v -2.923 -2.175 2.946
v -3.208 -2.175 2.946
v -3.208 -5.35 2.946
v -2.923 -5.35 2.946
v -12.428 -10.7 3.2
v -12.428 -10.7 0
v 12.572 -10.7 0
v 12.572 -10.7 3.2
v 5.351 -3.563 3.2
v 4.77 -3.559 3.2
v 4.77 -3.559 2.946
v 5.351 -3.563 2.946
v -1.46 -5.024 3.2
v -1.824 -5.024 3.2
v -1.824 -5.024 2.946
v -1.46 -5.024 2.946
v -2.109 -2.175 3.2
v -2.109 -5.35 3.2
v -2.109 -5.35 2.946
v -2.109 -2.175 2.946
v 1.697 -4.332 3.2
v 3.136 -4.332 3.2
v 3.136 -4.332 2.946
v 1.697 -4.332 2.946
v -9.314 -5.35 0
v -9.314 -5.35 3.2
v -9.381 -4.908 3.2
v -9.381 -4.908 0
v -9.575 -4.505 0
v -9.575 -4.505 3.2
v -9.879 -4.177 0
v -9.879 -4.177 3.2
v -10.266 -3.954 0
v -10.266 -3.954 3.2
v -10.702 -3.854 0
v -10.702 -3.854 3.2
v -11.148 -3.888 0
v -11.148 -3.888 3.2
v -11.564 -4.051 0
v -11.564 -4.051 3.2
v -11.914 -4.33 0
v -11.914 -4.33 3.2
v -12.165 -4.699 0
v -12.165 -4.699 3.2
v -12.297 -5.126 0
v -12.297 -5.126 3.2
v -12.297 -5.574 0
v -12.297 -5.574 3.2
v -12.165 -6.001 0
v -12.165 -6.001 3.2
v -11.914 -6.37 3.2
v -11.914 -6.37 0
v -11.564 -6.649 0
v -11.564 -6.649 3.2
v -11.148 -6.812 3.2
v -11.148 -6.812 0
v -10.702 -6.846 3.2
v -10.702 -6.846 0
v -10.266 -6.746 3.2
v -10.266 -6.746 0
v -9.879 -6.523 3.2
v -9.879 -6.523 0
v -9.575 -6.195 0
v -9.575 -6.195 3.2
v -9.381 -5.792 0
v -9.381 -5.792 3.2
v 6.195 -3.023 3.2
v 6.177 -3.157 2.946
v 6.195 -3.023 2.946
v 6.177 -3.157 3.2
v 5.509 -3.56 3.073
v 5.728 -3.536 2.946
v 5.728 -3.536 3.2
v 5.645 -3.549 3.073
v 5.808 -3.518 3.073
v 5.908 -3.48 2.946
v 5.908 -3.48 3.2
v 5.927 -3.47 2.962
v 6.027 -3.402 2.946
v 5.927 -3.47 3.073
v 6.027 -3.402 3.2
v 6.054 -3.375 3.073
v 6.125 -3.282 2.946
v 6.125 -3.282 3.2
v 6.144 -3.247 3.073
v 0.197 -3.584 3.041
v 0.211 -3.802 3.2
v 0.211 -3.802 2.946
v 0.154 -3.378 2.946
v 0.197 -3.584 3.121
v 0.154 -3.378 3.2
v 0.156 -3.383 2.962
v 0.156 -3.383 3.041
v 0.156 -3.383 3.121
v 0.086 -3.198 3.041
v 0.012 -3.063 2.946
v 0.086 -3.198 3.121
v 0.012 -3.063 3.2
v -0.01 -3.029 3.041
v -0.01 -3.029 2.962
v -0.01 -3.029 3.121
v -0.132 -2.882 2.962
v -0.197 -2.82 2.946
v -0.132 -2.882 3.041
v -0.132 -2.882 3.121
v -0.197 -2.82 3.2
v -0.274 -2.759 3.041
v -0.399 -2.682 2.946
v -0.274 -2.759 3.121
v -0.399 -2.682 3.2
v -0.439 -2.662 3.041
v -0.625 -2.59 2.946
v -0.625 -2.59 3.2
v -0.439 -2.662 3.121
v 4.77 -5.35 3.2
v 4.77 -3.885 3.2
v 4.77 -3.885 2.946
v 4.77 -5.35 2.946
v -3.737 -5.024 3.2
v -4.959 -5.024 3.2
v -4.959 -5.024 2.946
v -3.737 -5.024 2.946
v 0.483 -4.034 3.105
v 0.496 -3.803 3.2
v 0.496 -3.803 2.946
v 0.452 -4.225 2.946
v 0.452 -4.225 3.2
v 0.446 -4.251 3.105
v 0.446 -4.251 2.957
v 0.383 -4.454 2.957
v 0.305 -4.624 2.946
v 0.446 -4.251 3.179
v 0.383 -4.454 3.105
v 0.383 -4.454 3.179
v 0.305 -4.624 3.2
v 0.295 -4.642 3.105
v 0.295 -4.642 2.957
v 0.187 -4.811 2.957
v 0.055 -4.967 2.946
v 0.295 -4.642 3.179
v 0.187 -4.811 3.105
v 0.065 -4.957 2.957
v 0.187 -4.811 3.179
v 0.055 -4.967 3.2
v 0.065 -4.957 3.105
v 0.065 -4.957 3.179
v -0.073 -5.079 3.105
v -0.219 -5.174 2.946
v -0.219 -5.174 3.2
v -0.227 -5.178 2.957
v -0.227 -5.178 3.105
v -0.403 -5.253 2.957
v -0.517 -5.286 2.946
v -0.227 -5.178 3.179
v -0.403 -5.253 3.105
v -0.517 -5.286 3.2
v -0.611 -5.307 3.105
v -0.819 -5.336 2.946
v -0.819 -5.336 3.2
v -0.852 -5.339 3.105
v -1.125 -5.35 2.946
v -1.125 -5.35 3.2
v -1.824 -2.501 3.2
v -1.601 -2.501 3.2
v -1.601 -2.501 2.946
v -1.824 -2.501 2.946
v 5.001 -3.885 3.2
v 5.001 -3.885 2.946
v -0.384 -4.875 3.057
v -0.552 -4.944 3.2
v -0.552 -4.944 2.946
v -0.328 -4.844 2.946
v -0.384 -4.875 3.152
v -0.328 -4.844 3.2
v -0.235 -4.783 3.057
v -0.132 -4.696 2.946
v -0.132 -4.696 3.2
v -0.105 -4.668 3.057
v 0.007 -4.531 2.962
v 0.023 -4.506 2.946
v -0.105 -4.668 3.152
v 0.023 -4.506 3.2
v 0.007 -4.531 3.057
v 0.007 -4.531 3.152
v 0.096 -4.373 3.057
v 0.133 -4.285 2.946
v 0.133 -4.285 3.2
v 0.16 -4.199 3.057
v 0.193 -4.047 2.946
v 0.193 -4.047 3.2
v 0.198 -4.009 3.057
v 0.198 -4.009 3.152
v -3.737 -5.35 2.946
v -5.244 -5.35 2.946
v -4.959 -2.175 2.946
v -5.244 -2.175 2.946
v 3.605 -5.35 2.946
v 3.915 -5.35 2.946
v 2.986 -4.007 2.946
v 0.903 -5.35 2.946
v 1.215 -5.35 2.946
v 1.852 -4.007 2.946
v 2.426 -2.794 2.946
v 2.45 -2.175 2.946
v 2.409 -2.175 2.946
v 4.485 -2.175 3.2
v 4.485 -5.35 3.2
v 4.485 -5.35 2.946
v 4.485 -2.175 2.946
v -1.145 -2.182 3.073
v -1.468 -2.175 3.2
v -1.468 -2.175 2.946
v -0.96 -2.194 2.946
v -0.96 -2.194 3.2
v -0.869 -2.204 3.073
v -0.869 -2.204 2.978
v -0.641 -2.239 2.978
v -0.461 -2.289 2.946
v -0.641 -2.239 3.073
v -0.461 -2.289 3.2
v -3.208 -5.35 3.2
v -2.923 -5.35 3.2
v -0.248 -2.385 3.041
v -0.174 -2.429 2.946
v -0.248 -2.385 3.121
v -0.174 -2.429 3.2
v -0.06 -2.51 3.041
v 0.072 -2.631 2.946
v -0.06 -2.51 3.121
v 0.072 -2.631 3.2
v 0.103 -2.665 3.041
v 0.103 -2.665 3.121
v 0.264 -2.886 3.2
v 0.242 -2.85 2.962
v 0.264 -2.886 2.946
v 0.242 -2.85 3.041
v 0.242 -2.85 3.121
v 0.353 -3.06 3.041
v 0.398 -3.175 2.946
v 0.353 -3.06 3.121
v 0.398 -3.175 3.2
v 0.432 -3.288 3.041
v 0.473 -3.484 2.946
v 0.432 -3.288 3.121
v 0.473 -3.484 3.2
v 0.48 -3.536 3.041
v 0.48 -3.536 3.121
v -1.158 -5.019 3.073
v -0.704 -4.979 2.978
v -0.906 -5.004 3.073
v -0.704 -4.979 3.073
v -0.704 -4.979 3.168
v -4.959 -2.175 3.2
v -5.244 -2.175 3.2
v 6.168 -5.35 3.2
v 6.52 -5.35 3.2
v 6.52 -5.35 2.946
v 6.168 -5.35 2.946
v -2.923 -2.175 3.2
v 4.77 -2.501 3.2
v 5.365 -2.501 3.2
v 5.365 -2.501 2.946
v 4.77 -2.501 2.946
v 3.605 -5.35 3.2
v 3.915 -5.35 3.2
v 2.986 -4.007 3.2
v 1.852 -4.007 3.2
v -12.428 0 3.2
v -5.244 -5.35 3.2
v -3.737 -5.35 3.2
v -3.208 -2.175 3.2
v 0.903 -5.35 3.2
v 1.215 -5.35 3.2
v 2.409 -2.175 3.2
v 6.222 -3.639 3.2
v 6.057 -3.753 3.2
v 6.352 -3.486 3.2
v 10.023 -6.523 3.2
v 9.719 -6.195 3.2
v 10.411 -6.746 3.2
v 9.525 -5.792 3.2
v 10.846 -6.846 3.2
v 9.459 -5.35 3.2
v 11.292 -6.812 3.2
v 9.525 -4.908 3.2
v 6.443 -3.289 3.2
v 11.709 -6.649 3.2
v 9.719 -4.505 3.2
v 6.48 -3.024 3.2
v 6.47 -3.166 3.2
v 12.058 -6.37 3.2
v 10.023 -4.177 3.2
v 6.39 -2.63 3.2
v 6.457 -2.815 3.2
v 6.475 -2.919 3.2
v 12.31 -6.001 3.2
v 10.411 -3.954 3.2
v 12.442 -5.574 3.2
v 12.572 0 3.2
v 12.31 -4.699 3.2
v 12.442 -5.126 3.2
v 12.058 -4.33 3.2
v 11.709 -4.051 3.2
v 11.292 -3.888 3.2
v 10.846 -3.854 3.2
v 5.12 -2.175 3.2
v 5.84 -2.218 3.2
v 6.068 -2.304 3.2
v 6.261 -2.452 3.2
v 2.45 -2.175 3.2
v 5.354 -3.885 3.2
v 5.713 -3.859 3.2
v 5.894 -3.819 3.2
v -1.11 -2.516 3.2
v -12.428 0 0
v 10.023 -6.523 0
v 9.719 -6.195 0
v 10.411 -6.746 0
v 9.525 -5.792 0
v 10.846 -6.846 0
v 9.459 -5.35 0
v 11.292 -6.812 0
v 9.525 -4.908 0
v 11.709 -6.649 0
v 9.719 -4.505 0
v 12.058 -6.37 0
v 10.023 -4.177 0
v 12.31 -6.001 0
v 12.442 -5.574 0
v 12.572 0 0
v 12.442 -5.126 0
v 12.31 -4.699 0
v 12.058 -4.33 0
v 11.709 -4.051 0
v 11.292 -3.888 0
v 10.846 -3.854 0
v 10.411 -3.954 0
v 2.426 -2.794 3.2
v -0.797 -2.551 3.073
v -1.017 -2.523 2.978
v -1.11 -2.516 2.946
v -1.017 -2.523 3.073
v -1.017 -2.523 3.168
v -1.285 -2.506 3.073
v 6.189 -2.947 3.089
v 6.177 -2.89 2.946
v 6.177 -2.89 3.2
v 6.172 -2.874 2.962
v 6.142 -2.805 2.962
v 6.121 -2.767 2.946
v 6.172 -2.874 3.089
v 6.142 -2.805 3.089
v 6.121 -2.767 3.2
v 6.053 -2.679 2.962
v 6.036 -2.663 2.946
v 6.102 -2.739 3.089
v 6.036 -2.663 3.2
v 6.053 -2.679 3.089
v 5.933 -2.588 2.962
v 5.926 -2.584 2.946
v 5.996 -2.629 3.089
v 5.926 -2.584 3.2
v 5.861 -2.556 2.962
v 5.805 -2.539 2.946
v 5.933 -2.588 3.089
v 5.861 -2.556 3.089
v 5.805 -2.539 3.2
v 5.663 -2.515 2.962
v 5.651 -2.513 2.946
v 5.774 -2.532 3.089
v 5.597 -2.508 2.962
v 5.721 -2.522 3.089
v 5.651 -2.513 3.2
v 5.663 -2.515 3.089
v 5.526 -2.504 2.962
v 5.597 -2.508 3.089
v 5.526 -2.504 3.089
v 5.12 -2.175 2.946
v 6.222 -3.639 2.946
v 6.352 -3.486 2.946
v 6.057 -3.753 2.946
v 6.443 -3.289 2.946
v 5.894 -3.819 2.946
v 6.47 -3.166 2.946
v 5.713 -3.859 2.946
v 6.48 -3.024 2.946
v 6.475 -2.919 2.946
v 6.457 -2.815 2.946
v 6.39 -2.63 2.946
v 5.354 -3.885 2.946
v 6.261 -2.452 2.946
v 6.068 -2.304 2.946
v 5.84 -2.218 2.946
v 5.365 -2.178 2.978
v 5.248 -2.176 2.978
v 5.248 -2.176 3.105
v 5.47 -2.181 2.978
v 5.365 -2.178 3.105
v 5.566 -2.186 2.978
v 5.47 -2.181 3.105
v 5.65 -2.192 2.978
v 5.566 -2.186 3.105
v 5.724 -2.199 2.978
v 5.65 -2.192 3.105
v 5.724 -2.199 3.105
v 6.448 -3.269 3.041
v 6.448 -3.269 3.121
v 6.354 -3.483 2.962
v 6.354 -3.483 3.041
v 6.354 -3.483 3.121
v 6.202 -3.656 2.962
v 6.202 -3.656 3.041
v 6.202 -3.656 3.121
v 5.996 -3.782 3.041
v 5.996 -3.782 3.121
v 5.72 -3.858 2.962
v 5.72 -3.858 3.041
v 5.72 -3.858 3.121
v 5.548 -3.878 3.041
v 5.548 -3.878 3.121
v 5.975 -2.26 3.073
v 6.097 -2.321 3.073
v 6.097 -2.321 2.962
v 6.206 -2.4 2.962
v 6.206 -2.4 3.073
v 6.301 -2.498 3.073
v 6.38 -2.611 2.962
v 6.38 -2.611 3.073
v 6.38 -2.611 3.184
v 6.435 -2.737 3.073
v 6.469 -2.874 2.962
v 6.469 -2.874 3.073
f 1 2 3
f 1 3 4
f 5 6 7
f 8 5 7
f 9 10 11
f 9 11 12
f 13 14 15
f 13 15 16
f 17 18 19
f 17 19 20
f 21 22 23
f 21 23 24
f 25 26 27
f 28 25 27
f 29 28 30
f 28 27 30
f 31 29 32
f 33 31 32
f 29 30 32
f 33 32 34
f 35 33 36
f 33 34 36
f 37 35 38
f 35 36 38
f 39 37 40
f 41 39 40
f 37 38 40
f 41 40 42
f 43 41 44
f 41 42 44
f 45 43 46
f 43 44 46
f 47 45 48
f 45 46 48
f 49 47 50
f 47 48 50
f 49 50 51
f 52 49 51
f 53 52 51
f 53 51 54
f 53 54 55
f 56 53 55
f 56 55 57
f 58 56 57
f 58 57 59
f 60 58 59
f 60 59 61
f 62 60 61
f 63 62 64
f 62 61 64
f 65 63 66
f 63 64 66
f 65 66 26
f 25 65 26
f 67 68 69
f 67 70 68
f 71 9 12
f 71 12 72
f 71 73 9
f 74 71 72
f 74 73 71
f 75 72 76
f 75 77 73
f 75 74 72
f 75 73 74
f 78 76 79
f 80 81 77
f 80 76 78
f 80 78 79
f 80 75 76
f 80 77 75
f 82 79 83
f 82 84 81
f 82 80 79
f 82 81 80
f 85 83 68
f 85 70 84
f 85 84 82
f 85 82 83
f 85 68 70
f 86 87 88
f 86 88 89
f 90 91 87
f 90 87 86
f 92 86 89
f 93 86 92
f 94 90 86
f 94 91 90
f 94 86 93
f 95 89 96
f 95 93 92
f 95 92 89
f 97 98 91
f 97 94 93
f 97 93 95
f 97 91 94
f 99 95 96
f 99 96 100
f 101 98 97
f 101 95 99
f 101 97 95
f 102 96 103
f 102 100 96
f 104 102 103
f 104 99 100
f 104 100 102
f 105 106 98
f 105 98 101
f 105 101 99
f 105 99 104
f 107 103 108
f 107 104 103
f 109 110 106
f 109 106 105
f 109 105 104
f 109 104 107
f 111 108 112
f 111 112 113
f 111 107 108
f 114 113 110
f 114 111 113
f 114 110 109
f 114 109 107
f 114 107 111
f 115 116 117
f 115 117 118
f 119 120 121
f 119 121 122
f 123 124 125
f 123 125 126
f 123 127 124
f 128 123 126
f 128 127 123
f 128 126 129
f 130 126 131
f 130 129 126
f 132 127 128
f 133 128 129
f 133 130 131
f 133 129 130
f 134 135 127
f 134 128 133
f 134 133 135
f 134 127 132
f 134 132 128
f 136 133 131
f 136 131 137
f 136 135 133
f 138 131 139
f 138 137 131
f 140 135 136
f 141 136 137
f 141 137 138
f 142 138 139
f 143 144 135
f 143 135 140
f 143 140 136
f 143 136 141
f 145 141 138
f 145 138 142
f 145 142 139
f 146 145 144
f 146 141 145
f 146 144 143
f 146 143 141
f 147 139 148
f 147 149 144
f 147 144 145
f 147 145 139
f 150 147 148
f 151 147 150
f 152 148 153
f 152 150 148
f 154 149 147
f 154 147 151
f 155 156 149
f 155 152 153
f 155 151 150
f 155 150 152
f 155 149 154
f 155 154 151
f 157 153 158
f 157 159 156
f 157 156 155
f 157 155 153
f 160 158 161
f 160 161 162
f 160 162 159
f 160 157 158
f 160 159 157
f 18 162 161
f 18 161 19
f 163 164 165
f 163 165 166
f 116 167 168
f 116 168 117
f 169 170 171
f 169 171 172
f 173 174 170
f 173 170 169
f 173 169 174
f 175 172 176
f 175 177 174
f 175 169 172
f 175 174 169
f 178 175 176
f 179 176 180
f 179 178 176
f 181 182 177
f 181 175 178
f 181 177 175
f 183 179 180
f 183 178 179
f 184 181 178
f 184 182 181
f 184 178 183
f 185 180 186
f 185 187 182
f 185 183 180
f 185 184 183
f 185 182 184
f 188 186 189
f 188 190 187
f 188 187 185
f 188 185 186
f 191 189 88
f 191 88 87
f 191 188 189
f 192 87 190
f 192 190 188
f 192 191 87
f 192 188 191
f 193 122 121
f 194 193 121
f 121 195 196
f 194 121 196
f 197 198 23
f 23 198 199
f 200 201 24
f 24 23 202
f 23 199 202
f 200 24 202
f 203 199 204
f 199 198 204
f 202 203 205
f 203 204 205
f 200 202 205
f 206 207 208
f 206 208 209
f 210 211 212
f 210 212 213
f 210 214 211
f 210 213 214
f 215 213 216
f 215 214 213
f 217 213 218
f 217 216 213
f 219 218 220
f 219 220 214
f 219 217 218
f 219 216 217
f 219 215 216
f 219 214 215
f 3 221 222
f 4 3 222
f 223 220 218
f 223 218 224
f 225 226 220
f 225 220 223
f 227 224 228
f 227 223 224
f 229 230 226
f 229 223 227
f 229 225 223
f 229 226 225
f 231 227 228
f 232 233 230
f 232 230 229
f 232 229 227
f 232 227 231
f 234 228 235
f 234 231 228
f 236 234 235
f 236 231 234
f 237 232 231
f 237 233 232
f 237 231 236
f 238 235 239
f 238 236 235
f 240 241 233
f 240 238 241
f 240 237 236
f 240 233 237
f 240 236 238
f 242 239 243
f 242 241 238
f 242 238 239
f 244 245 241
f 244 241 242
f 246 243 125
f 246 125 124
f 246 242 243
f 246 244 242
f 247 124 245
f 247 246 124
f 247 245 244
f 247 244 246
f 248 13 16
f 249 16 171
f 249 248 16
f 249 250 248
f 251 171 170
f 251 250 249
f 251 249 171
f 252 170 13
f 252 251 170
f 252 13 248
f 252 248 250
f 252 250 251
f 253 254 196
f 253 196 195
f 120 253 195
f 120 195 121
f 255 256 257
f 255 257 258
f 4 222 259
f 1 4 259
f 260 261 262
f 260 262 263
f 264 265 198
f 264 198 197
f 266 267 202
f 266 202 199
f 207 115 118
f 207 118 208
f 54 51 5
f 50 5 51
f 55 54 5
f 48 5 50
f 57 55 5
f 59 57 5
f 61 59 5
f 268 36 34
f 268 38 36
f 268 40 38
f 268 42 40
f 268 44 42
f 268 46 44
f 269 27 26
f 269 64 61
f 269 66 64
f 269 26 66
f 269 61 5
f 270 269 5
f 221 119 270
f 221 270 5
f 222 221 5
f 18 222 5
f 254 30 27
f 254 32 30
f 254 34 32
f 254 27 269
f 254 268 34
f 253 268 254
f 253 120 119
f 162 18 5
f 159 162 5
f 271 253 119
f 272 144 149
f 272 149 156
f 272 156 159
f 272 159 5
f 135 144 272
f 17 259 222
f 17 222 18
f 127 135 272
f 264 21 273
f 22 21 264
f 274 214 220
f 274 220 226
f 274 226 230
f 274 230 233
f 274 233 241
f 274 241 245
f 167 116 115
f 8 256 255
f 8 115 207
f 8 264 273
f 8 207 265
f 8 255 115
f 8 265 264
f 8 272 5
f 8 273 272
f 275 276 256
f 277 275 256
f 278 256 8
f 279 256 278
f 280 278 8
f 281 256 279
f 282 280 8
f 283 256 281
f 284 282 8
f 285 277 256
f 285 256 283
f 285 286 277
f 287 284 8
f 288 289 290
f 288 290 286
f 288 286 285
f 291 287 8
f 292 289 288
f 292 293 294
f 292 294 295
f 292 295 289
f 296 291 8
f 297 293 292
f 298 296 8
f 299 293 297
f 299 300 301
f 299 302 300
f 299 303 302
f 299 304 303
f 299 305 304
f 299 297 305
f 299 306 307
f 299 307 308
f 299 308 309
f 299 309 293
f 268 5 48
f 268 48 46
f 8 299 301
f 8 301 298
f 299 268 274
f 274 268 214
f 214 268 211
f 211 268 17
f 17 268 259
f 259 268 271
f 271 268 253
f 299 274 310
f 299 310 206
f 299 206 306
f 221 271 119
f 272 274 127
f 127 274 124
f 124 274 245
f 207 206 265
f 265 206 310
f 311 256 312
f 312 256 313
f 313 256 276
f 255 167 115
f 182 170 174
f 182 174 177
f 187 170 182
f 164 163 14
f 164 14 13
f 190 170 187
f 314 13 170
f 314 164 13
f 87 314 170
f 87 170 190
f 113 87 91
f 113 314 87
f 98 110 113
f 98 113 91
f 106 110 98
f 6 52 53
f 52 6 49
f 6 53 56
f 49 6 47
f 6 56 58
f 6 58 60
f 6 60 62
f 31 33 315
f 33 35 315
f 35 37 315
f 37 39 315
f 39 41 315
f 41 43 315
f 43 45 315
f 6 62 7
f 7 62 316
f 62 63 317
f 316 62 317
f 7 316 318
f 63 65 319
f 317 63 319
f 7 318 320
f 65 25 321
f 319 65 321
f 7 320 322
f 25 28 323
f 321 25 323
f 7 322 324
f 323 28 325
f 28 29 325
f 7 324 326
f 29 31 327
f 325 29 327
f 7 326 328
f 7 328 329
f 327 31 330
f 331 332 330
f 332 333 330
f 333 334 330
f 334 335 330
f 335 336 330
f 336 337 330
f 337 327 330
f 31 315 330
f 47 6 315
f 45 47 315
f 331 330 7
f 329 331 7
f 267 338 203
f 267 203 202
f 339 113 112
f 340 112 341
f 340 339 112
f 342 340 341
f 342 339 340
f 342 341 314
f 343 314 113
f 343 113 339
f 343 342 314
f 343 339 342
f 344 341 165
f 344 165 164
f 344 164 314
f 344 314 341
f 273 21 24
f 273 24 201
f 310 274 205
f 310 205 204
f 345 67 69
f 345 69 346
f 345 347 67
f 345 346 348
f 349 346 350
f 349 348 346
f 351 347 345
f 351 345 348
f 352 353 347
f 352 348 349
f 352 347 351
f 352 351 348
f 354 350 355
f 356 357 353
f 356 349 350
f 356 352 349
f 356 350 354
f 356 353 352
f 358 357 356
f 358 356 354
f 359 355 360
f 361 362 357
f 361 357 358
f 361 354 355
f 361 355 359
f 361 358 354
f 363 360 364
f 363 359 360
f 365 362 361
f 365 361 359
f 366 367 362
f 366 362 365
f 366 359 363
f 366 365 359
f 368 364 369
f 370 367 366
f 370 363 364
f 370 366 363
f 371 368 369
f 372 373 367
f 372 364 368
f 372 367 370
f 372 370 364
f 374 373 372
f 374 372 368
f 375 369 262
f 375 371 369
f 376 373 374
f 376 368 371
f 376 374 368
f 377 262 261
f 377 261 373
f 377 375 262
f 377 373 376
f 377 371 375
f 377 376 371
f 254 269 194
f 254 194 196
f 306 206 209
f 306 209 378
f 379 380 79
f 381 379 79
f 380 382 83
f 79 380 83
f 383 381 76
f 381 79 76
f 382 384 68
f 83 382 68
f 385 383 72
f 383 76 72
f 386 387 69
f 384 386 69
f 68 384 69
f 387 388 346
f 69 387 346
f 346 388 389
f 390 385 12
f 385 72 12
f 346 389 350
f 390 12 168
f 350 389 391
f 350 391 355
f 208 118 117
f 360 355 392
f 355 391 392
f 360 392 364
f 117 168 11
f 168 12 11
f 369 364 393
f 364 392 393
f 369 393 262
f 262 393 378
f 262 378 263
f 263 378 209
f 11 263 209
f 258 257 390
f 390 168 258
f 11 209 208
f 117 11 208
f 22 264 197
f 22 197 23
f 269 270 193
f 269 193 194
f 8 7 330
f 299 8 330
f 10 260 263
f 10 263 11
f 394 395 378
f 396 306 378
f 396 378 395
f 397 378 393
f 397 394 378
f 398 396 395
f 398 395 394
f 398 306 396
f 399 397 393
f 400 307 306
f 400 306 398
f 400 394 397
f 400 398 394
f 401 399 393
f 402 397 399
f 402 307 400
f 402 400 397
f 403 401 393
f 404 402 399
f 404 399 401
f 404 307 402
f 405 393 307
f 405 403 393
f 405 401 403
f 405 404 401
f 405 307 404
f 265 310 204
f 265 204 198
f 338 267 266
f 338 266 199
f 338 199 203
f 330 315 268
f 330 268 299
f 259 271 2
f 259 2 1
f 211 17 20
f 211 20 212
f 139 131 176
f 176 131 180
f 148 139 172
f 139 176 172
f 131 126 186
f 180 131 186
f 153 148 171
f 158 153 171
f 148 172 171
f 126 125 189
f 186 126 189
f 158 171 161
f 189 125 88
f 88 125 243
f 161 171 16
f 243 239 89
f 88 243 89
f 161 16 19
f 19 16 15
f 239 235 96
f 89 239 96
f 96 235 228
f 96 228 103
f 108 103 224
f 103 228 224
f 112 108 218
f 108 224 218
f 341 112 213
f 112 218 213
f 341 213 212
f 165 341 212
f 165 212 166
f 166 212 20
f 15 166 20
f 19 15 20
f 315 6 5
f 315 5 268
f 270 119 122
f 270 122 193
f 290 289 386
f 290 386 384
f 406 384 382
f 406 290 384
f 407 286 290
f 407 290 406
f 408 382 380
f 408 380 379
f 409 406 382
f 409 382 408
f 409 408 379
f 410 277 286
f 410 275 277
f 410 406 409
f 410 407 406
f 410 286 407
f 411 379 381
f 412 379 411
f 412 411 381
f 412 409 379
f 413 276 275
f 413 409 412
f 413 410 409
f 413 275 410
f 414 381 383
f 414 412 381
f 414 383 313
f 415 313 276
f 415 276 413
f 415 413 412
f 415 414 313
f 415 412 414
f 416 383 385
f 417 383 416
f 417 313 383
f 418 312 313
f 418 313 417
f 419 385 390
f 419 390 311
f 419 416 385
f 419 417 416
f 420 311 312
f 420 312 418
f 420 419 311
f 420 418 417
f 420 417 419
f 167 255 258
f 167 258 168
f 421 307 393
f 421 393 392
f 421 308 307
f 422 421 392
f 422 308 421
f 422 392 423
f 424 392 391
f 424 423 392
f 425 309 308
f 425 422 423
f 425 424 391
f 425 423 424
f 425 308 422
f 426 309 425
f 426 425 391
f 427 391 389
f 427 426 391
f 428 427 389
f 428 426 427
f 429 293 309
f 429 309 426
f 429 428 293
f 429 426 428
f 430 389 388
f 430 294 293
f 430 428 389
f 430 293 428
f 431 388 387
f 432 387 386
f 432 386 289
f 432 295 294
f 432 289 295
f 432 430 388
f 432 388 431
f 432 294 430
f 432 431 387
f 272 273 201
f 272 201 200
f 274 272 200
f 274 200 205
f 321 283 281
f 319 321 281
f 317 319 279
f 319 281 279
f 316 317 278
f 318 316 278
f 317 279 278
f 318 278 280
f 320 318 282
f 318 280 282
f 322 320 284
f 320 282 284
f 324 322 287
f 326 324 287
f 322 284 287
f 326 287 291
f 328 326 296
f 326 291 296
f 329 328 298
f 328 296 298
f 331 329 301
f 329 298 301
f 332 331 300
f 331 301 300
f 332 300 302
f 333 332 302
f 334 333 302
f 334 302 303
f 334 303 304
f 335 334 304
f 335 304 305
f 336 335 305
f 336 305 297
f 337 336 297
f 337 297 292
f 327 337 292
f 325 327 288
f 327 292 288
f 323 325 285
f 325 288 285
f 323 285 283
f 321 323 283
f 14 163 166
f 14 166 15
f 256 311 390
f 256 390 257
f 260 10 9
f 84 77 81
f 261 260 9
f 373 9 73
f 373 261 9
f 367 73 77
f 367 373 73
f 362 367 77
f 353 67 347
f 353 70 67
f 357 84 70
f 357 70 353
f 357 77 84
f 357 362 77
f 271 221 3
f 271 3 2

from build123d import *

# Parameters (mm, degrees)
SKETCH2_W           = 25
SKETCH2_H           = 10.7
BOSS_EXTRUDE1_DEPTH = 3.2
SKETCH3_R           = 1.5
CUT_EXTRUDE2_DEPTH  = 3.2
SKETCH4_W           = 0.284935898
SKETCH4_H           = 3.175
CUT_EXTRUDE3_DEPTH  = 0.254


with BuildPart() as part:
    # Sketch2 → Boss-Extrude1 (new body)
    with BuildSketch(Plane.XY):
        with Locations((0.072254335, -5.35)):
            Rectangle(SKETCH2_W, SKETCH2_H)
    extrude(amount=BOSS_EXTRUDE1_DEPTH)

    # Sketch3 → Cut-Extrude2 (cut)
    with BuildSketch(Plane.XY.offset(3.2)):
        with Locations((-10.814046376, -5.35)):
            Circle(SKETCH3_R)
        with Locations(Location((10.958555047, -5.35, 0), (0, 0, 180))):
            Circle(SKETCH3_R)
    extrude(amount=-CUT_EXTRUDE2_DEPTH, mode=Mode.SUBTRACT)

    # Sketch4 → Cut-Extrude3 (cut)
    # profile 1 of 5: a face of its own
    with BuildSketch(Plane.XY.offset(3.2)):
        Polygon((-5.243533556, -2.175), (-4.958597658, -2.175), (-4.958597658, -5.024358974), (-3.737443812, -5.024358974), (-3.737443812, -5.35), (-5.243533556, -5.35), align=None)
    # profile 2 of 5: a face of its own
    with BuildSketch(Plane.XY.offset(3.2)):
        with Locations((-3.065809197, -3.7625)):
            Rectangle(SKETCH4_W, SKETCH4_H)
    # profile 3 of 5: a face of its own
    with BuildSketch(Plane.XY.offset(3.2)):
        with BuildLine():
            Line((-2.109238684, -5.35), (-2.109238684, -2.175))
            Line((-2.109238684, -2.175), (-1.468132915, -2.175))
            add(Edge.make_bspline(
                [(-1.468132915, -2.175), (-1.412371761, -2.175401474), (-1.304641503, -2.17617712), (-1.148964497, -2.181095097), (-1.004924941, -2.189795019), (-0.872996561, -2.202467375), (-0.752817176, -2.218027627), (-0.644723296, -2.237531565), (-0.548155995, -2.260562263), (-0.48876586, -2.280197778), (-0.460680992, -2.289483173)],
                knots=[0, 0, 0, 0, 1.314313732, 2.53924729, 3.670748893, 4.714932338, 5.66265055, 6.526160246, 7.303039223, 8, 8, 8, 8], degree=3))
            add(Edge.make_bspline(
                [(-0.460680992, -2.289483173), (-0.423946478, -2.303481027), (-0.351310468, -2.331159311), (-0.247889721, -2.383371099), (-0.150530285, -2.442528698), (-0.05871006, -2.508710088), (0.025473546, -2.583789176), (0.105309281, -2.664576675), (0.177531209, -2.754010383), (0.243669449, -2.850235551), (0.303301083, -2.952118627), (0.355134462, -3.059465476), (0.398182013, -3.171730943), (0.433917297, -3.288602827), (0.462080869, -3.410338113), (0.481295908, -3.537078548), (0.493969591, -3.668323242), (0.495243266, -3.757381505), (0.495889521, -3.802569111)],
                knots=[0, 0, 0, 0, 0.984719456, 1.947108742, 2.898477687, 3.838006223, 4.779231079, 5.722358779, 6.681677486, 7.655904652, 8.64651281, 9.637519902, 10.640069247, 11.656948941, 12.698408672, 13.768548281, 14.867775369, 16, 16, 16, 16], degree=3))
            add(Edge.make_bspline(
                [(0.495889521, -3.802569111), (0.495318958, -3.841813234), (0.494194603, -3.919147878), (0.484098724, -4.033122119), (0.46942449, -4.143715145), (0.446705825, -4.250400316), (0.419126402, -4.354112342), (0.383780351, -4.453745878), (0.343289579, -4.550214905), (0.296072904, -4.642215044), (0.244237505, -4.729376388), (0.188609923, -4.811541332), (0.129249492, -4.887537426), (0.065590168, -4.95759481), (-0.001545403, -5.02160787), (-0.07259676, -5.080111341), (-0.147747242, -5.131960502), (-0.226660255, -5.179192807), (-0.311637886, -5.220395558), (-0.404289708, -5.255257067), (-0.505010848, -5.284146497), (-0.61355408, -5.308250095), (-0.730106949, -5.327370219), (-0.854783725, -5.340184875), (-0.987392852, -5.34885075), (-1.078451186, -5.349609478), (-1.125319413, -5.35)],
                knots=[0, 0, 0, 0, 1.105936401, 2.179363191, 3.223086493, 4.248585256, 5.251745608, 6.245858792, 7.225916811, 8.198733463, 9.158002045, 10.082870192, 10.993790845, 11.873723703, 12.748670949, 13.606408763, 14.465103618, 15.319838547, 16.196477973, 17.123216899, 18.106603292, 19.147568657, 20.255746949, 21.433717677, 22.679120308, 24, 24, 24, 24], degree=3))
            Line((-1.125319413, -5.35), (-2.109238684, -5.35))
        make_face()
        with BuildLine():
            Line((-1.824302787, -5.024358974), (-1.459864686, -5.024358974))
            add(Edge.make_bspline(
                [(-1.459864686, -5.024358974), (-1.407496806, -5.024133916), (-1.306774196, -5.023701045), (-1.161941585, -5.019902653), (-1.029608132, -5.013696039), (-0.909755049, -5.005010075), (-0.802450005, -4.993517832), (-0.707468746, -4.980704527), (-0.625122619, -4.964741125), (-0.575293773, -4.950271326), (-0.55226753, -4.943584736)],
                knots=[0, 0, 0, 0, 1.375205317, 2.645023457, 3.804390687, 4.853969522, 5.800190428, 6.637939096, 7.370582563, 8, 8, 8, 8], degree=3))
            add(Edge.make_bspline(
                [(-0.55226753, -4.943584736), (-0.523285802, -4.933377965), (-0.466014573, -4.913208212), (-0.383572445, -4.876416619), (-0.306685734, -4.832835599), (-0.234014497, -4.784392108), (-0.166589602, -4.72937752), (-0.103612011, -4.668988123), (-0.04520852, -4.602916577), (0.00801746, -4.531244888), (0.055649992, -4.454419144), (0.096898893, -4.373194631), (0.133049926, -4.28846131), (0.161424078, -4.198918002), (0.183663215, -4.105365213), (0.199415467, -4.007796363), (0.209225967, -3.906229671), (0.210370281, -3.837148816), (0.210953624, -3.801933093)],
                knots=[0, 0, 0, 0, 0.998632004, 1.973411704, 2.929992603, 3.868527914, 4.809262121, 5.754881198, 6.702106254, 7.672490631, 8.653608572, 9.636854334, 10.631411391, 11.644891563, 12.686317036, 13.754757253, 14.855430412, 16, 16, 16, 16], degree=3))
            add(Edge.make_bspline(
                [(0.210953624, -3.801933093), (0.210487999, -3.764800579), (0.209573274, -3.691853426), (0.198075864, -3.584819009), (0.181274167, -3.481875848), (0.156977538, -3.383017056), (0.126015955, -3.288049765), (0.08737653, -3.19749921), (0.043228954, -3.110409079), (-0.009297645, -3.028789475), (-0.066824647, -2.951597869), (-0.130667438, -2.880881624), (-0.199811715, -2.816479652), (-0.273503329, -2.75738899), (-0.353819126, -2.705986941), (-0.438867117, -2.66000688), (-0.529894976, -2.620985322), (-0.593225064, -2.600230925), (-0.625409557, -2.589683494)],
                knots=[0, 0, 0, 0, 1.122418816, 2.205001699, 3.251619955, 4.274784885, 5.280384055, 6.268708349, 7.249350384, 8.229342522, 9.199999885, 10.157847722, 11.105861043, 12.055065948, 13.010012805, 13.98527497, 14.976112212, 16, 16, 16, 16], degree=3))
            add(Edge.make_bspline(
                [(-0.625409557, -2.589683494), (-0.65203524, -2.582320734), (-0.708648747, -2.566665487), (-0.801031689, -2.549588185), (-0.905004004, -2.534525532), (-1.021027304, -2.521772882), (-1.148969335, -2.512622241), (-1.288928494, -2.505753977), (-1.440965279, -2.501121532), (-1.546359434, -2.500805204), (-1.601060599, -2.500641026)],
                knots=[0, 0, 0, 0, 0.674548936, 1.434276114, 2.292660221, 3.240891867, 4.284742987, 5.42552168, 6.663806718, 8, 8, 8, 8], degree=3))
            Line((-1.601060599, -2.500641026), (-1.824302787, -2.500641026))
            Line((-1.824302787, -2.500641026), (-1.824302787, -5.024358974))
        make_face(mode=Mode.SUBTRACT)
    # profile 4 of 5: a face of its own
    with BuildSketch(Plane.XY.offset(3.2)):
        Polygon((2.449735675, -2.175), (3.91512029, -5.35), (3.605379705, -5.35), (3.135998696, -4.332371795), (1.696690803, -4.332371795), (1.214589441, -5.35), (0.902940803, -5.35), (2.409030547, -2.175), align=None)
        Polygon((2.426203023, -2.79448117), (1.851879104, -4.006730769), (2.985898536, -4.006730769), align=None, mode=Mode.SUBTRACT)
    # profile 5 of 5: a face of its own
    with BuildSketch(Plane.XY.offset(3.2)):
        with BuildLine():
            Line((4.484992085, -2.175), (5.120373696, -2.175))
            add(Edge.make_bspline(
                [(5.120373696, -2.175), (5.162774577, -2.175141139), (5.244188965, -2.175412141), (5.360823289, -2.176923226), (5.466802155, -2.181254248), (5.562070152, -2.18498132), (5.646625532, -2.191777582), (5.720727574, -2.198273311), (5.784034986, -2.206776561), (5.822358008, -2.214673623), (5.839709633, -2.218249199)],
                knots=[0, 0, 0, 0, 1.410062039, 2.707475311, 3.878576406, 4.937260626, 5.877586885, 6.699081471, 7.410979367, 8, 8, 8, 8], degree=3))
            add(Edge.make_bspline(
                [(5.839709633, -2.218249199), (5.862938499, -2.223988479), (5.908900697, -2.235344604), (5.975076828, -2.259347242), (6.038136251, -2.287123616), (6.09781702, -2.319747848), (6.153820202, -2.357462112), (6.206723241, -2.399615338), (6.256766197, -2.445976874), (6.301925247, -2.497715623), (6.344505673, -2.551995886), (6.380418213, -2.610691437), (6.411375805, -2.672070108), (6.436023345, -2.736756123), (6.455869793, -2.804122159), (6.469863596, -2.874778424), (6.478255744, -2.948403023), (6.479110142, -2.998620555), (6.479543367, -3.024083534)],
                knots=[0, 0, 0, 0, 1.027469482, 2.033020251, 3.019912614, 3.986113645, 4.951240523, 5.91722682, 6.890402269, 7.87763091, 8.8651537, 9.85103654, 10.82876324, 11.815024772, 12.821070561, 13.842952187, 14.906261191, 16, 16, 16, 16], degree=3))
            add(Edge.make_bspline(
                [(6.479543367, -3.024083534), (6.478210776, -3.066388236), (6.475610546, -3.148935667), (6.451367059, -3.268733752), (6.411655502, -3.380484059), (6.356933661, -3.48404588), (6.287247422, -3.577400537), (6.203495647, -3.659397593), (6.105631614, -3.728013799), (6.014527877, -3.775595987), (5.934051425, -3.806069554), (5.867799777, -3.827511108), (5.795530447, -3.844077319), (5.717935865, -3.858918296), (5.634693121, -3.870123047), (5.546001728, -3.878329601), (5.451798433, -3.883458631), (5.387083706, -3.884222449), (5.353792165, -3.884615385)],
                knots=[0, 0, 0, 0, 1.260483769, 2.459530307, 3.627416485, 4.787058657, 5.939039949, 7.08810263, 8.267026773, 9.491475466, 10.141966685, 10.831826277, 11.566392101, 12.351337768, 13.187381173, 14.07005841, 15.007169909, 16, 16, 16, 16], degree=3))
            Line((5.353792165, -3.884615385), (6.520248495, -5.35))
            Line((6.520248495, -5.35), (6.167894729, -5.35))
            Line((6.167894729, -5.35), (5.001438399, -3.884615385))
            Line((5.001438399, -3.884615385), (4.769927983, -3.884615385))
            Line((4.769927983, -3.884615385), (4.769927983, -5.35))
            Line((4.769927983, -5.35), (4.484992085, -5.35))
            Line((4.484992085, -5.35), (4.484992085, -2.175))
        make_face()
        with BuildLine():
            Line((4.769927983, -2.500641026), (4.769927983, -3.558974359))
            Line((4.769927983, -3.558974359), (5.351248095, -3.563426482))
            add(Edge.make_bspline(
                [(5.351248095, -3.563426482), (5.378389844, -3.56343849), (5.430998286, -3.563461764), (5.507108174, -3.559838838), (5.577974276, -3.5557174), (5.643325529, -3.54941335), (5.70319113, -3.541288914), (5.757541155, -3.531126207), (5.806464323, -3.519286121), (5.863522283, -3.500960361), (5.927236851, -3.47192633), (5.996480389, -3.429684771), (6.055446796, -3.376554212), (6.105265142, -3.31579972), (6.145296841, -3.249001123), (6.173519919, -3.176959131), (6.191429134, -3.101492467), (6.193541458, -3.049623755), (6.19460747, -3.023447516)],
                knots=[0, 0, 0, 0, 1.146690395, 2.22261258, 3.21895312, 4.145990853, 4.996080663, 5.770904154, 6.481378293, 7.121626537, 8.300444488, 9.431385265, 10.535395872, 11.636531494, 12.74115979, 13.810798291, 14.895190096, 16, 16, 16, 16], degree=3))
            add(Edge.make_bspline(
                [(6.19460747, -3.023447516), (6.193516974, -2.997914553), (6.19135601, -2.947317536), (6.173713199, -2.87324396), (6.143877831, -2.803333227), (6.10367123, -2.73786973), (6.054686282, -2.67844667), (5.99724798, -2.627603895), (5.932926839, -2.585649024), (5.872809395, -2.558838978), (5.819075502, -2.542401683), (5.772421453, -2.530834556), (5.719706041, -2.521541359), (5.660673304, -2.514095475), (5.595575253, -2.507695633), (5.524082734, -2.503385091), (5.446670083, -2.500832514), (5.393015367, -2.500706341), (5.365240483, -2.500641026)],
                knots=[0, 0, 0, 0, 1.101028733, 2.181837193, 3.264309656, 4.369019818, 5.486613113, 6.575447106, 7.666700264, 8.788928104, 9.402425223, 10.0903467, 10.862060571, 11.710948788, 12.657782767, 13.684531032, 14.801375019, 16, 16, 16, 16], degree=3))
            Line((5.365240483, -2.500641026), (4.769927983, -2.500641026))
        make_face(mode=Mode.SUBTRACT)
    extrude(amount=-CUT_EXTRUDE3_DEPTH, mode=Mode.SUBTRACT)


solid = part.part
